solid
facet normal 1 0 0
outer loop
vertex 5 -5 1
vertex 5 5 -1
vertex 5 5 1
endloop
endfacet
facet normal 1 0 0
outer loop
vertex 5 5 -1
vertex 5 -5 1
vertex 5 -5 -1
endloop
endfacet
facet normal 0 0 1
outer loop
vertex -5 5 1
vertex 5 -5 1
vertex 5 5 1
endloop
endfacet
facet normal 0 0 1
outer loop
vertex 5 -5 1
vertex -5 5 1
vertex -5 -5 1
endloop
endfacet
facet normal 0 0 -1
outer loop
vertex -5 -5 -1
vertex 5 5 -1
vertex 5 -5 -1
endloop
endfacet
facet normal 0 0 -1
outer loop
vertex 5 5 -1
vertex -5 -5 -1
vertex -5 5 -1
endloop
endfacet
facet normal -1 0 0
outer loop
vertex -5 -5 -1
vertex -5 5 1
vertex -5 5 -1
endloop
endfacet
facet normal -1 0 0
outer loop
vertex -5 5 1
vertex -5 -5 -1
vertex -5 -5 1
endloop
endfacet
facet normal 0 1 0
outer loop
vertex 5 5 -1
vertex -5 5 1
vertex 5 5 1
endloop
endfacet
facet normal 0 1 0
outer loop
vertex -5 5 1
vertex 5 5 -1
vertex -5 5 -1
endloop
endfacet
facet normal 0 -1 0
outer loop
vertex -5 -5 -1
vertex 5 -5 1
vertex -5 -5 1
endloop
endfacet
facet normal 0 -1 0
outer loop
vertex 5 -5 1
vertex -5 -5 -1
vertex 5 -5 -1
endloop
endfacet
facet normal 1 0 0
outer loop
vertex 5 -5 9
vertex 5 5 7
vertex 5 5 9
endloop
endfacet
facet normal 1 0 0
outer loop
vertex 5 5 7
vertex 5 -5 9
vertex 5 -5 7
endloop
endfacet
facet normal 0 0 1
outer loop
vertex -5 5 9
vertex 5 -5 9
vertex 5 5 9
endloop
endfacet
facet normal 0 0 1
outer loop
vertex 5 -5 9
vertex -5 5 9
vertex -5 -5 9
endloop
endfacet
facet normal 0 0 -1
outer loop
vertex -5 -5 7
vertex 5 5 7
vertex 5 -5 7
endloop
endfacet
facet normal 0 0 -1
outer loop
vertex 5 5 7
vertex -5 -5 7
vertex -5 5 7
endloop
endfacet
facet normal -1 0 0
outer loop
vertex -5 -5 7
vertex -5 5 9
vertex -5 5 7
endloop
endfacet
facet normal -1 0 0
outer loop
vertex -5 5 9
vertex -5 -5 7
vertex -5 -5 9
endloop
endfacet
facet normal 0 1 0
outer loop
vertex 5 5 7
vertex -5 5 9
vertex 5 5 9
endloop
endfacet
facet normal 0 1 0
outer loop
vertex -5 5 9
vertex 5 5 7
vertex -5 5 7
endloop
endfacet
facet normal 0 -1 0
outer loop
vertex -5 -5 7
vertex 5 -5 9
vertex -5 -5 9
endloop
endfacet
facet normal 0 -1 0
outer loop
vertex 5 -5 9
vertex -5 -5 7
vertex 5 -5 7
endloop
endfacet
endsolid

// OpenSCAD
// Stream F digital exploded placeholder for dock
// Not a tooling model. Not an ergonomic pass.
// dock shell concept envelope
module exploded_placeholder() {
  translate([0,0,0]) cube([10,10,2], center=true);
  translate([0,0,8]) cube([10,10,2], center=true);
}
exploded_placeholder();
